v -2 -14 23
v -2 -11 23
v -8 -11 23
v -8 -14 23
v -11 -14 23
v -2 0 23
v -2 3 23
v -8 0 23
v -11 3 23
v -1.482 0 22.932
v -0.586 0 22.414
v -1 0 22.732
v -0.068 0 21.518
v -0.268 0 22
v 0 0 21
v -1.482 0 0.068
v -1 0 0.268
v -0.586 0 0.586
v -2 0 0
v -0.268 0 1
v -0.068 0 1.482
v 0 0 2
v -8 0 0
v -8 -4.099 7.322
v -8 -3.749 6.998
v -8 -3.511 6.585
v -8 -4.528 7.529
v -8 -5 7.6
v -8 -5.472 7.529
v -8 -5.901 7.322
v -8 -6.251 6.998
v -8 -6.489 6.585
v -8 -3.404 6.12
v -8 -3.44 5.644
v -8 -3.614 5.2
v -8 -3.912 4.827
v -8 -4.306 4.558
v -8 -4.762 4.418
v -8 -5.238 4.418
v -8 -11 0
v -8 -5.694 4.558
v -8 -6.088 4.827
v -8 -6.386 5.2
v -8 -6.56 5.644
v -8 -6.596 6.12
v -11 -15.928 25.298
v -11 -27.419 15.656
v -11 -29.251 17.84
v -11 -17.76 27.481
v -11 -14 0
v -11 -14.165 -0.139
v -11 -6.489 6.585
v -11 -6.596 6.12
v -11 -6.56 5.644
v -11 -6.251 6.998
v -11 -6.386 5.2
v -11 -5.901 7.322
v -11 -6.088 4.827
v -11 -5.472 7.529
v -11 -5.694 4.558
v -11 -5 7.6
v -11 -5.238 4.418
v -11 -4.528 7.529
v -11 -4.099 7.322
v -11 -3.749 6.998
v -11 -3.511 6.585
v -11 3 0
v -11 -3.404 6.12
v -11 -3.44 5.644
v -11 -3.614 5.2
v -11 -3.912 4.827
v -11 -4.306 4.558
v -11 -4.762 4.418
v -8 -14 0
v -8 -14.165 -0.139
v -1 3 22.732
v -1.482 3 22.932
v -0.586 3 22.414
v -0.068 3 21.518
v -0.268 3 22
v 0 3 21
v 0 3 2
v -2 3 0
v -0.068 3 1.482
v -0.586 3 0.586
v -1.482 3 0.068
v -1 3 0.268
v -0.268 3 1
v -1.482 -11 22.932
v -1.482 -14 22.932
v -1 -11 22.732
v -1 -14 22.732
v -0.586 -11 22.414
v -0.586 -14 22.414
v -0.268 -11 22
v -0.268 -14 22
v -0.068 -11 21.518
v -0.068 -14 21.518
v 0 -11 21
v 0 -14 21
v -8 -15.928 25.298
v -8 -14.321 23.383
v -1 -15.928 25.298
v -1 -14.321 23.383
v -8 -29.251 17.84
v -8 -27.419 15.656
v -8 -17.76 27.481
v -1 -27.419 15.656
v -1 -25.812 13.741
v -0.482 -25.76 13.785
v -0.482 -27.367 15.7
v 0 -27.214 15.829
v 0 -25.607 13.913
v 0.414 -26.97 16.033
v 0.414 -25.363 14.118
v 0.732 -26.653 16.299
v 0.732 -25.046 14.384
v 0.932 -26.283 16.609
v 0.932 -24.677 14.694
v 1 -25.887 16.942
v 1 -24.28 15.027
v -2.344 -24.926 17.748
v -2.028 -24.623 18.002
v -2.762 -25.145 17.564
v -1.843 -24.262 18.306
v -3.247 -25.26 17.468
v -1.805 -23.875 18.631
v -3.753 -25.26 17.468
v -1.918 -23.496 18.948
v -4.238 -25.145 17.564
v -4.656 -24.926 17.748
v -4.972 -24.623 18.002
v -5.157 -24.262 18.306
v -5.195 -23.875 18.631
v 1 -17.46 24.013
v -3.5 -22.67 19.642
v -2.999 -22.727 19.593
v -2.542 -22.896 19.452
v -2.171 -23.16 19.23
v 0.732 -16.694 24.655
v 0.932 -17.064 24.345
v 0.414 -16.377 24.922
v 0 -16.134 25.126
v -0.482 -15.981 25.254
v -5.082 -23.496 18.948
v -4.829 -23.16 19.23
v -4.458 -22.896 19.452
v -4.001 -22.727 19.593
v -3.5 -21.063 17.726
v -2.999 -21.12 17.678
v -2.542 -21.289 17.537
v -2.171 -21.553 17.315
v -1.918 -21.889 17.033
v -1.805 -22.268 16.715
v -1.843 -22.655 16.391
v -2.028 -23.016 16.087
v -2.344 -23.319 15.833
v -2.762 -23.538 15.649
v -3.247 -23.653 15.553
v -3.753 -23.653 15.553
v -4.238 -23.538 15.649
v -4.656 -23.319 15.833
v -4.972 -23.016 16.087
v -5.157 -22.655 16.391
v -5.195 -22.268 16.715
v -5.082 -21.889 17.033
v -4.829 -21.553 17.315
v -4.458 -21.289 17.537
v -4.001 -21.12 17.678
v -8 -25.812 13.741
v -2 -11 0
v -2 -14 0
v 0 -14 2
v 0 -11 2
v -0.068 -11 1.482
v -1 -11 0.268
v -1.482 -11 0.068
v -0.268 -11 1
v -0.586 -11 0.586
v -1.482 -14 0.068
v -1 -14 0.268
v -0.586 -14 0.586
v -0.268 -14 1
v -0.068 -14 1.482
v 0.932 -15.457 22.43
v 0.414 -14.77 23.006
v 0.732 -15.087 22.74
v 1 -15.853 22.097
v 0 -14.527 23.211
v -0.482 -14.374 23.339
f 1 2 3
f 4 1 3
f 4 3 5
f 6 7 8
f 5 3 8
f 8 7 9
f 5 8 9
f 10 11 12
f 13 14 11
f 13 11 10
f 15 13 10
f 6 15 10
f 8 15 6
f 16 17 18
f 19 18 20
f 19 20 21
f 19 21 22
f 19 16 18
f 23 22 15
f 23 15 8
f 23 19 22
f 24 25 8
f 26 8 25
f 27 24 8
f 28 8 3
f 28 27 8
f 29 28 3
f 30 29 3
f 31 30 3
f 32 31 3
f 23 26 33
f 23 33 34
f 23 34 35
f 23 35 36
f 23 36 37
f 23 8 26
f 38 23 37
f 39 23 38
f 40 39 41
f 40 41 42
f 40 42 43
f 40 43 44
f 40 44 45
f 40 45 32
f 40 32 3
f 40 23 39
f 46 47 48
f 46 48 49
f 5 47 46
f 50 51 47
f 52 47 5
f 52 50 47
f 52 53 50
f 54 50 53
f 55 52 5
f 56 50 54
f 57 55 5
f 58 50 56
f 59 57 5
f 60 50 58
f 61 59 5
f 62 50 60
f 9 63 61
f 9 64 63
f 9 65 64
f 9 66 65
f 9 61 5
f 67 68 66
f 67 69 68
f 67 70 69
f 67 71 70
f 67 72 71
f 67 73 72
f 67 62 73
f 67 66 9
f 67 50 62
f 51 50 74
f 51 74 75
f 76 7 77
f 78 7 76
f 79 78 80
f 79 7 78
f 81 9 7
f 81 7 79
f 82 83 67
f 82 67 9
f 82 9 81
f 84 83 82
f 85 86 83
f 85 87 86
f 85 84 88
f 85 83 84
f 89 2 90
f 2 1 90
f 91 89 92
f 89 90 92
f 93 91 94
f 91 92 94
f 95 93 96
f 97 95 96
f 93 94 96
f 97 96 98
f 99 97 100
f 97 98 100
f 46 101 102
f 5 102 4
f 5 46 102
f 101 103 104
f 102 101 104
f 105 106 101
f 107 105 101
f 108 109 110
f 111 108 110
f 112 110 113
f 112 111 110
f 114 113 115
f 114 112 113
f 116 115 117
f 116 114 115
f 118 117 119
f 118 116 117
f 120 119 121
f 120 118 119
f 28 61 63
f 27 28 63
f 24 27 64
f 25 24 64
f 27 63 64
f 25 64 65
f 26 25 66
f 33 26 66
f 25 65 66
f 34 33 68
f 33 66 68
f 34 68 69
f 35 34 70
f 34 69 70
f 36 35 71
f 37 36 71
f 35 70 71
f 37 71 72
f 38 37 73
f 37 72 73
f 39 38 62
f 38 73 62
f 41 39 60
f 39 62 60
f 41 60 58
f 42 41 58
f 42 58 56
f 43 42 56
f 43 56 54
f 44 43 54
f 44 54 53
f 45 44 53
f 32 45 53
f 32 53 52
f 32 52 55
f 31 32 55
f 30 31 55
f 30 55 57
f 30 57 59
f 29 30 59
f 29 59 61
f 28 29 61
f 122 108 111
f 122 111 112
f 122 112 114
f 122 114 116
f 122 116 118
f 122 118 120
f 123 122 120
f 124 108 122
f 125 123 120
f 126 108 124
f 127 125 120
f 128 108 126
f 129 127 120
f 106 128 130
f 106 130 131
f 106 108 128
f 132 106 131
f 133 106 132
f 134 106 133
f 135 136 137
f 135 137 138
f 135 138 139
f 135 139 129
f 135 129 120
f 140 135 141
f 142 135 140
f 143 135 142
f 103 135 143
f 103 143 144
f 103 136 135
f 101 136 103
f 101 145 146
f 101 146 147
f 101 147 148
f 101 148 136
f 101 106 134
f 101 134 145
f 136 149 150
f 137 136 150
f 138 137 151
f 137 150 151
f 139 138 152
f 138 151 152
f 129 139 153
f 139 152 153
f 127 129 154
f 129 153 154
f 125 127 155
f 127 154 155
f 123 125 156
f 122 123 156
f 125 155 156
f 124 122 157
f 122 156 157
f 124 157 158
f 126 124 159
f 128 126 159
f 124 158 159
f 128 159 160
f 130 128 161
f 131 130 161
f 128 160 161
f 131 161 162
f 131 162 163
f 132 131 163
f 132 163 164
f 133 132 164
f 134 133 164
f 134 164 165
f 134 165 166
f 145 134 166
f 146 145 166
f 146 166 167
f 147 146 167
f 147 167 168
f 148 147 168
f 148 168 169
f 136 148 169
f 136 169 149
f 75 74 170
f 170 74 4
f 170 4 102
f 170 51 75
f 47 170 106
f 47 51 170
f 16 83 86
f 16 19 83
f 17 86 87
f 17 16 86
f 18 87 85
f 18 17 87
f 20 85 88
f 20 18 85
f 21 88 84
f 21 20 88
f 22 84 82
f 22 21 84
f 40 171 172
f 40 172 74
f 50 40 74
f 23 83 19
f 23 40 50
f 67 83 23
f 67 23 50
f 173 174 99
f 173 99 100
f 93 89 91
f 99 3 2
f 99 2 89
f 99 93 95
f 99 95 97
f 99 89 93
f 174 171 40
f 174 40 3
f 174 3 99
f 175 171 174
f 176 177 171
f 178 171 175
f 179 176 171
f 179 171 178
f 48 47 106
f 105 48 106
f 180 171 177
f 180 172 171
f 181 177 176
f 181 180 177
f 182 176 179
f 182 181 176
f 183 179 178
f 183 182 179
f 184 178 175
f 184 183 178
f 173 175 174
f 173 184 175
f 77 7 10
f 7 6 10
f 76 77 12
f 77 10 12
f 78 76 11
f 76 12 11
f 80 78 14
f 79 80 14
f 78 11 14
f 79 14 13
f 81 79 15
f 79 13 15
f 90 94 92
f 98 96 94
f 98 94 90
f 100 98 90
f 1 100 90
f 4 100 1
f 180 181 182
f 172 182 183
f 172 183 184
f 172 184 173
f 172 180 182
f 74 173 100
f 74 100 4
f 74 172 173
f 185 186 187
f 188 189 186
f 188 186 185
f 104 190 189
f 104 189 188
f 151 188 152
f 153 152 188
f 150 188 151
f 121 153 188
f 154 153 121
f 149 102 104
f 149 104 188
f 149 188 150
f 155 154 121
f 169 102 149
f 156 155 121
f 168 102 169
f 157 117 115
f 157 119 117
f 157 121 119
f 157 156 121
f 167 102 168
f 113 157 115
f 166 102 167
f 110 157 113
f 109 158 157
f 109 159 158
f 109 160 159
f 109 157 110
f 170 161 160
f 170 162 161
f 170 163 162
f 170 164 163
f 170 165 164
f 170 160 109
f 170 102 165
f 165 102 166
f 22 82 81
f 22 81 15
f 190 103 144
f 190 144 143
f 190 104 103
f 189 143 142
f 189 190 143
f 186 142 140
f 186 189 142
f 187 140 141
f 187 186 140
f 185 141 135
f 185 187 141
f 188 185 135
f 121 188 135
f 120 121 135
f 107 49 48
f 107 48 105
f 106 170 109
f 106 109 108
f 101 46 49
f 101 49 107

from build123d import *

# Parameters (mm, degrees)
BOSS_EXTRUDE1_DEPTH = 23
BOSS_EXTRUDE3_DEPTH = 3
BOSS_EXTRUDE4_DEPTH = 9
SKETCH4_R           = 1.7
CUT_EXTRUDE1_DEPTH  = 32.237159536
SKETCH5_W           = 3
SKETCH5_H           = 15
BOSS_EXTRUDE5_DEPTH = 2.85
SKETCH6_R           = 1.6
CUT_EXTRUDE2_DEPTH  = 42.890865789
FILLET1_R           = 2


with BuildPart() as part:
    # Sketch1 → Boss-Extrude1 (new body)
    with BuildSketch(Plane.XY):
        Polygon((0, 0), (-8, 0), (-8, -11), (0, -11), (0, -14), (-11, -14), (-11, 3), (0, 3), align=None)
    extrude(amount=BOSS_EXTRUDE1_DEPTH)

    # Sketch2 → Boss-Extrude3 (add)
    with BuildSketch(Plane.ZY.offset(11)):
        Polygon((23, -14), (0, -14), (-0.138768188, -14.165377487), (15.656319184, -27.419029476), (25.298133329, -15.928362829), align=None)
    extrude(amount=-BOSS_EXTRUDE3_DEPTH)

    # Sketch3 → Boss-Extrude4 (add)
    with BuildSketch(Plane(origin=(-8, 0, 0), x_dir=(0, 0, -1), z_dir=(1, 0, 0))):
        Polygon((-25.298133329, -15.928362829), (-23.383022222, -14.321393805), (-13.741208076, -25.812060452), (-15.656319184, -27.419029476), align=None)
    extrude(amount=BOSS_EXTRUDE4_DEPTH)

    # Sketch4 → Cut-Extrude1 (cut, through all)
    with BuildSketch(Plane(origin=(0, -17.431145721, 20.773630536), x_dir=(-1, 0, 0), z_dir=(0, 0.6427876096865378, -0.7660444431189795))):
        with Locations(Location((3.5, -6.440507181, 0), (0, 0, 90))):
            Circle(SKETCH4_R)
    extrude(amount=-CUT_EXTRUDE1_DEPTH, mode=Mode.SUBTRACT)

    # Sketch5 → Boss-Extrude5 (add)
    with BuildSketch(Plane(origin=(0, -19.038114745, 22.688741644), x_dir=(1, 0, 0), z_dir=(0, -0.6427876096865379, 0.7660444431189792))):
        with Locations((-9.5, -3.440507181)):
            Rectangle(SKETCH5_W, SKETCH5_H)
    extrude(amount=BOSS_EXTRUDE5_DEPTH)

    # Sketch6 → Cut-Extrude2 (cut, through all)
    with BuildSketch(Plane.ZY.offset(11)):
        with Locations((6, -5)):
            Circle(SKETCH6_R)
    extrude(amount=-CUT_EXTRUDE2_DEPTH, mode=Mode.SUBTRACT)

    # Fillet1
    fillet1_edges = [part.edges().sort_by_distance(p)[0] for p in [
        (0, 1.5, 0),
        (0, -12.5, 23),
        (0, 1.5, 23),
        (1, -26.615544964, 14.69876363),
        (1, -15.124878317, 24.340577775),
        (0, -12.5, 0),
    ]]
    fillet(fillet1_edges, radius=FILLET1_R)


solid = part.part
